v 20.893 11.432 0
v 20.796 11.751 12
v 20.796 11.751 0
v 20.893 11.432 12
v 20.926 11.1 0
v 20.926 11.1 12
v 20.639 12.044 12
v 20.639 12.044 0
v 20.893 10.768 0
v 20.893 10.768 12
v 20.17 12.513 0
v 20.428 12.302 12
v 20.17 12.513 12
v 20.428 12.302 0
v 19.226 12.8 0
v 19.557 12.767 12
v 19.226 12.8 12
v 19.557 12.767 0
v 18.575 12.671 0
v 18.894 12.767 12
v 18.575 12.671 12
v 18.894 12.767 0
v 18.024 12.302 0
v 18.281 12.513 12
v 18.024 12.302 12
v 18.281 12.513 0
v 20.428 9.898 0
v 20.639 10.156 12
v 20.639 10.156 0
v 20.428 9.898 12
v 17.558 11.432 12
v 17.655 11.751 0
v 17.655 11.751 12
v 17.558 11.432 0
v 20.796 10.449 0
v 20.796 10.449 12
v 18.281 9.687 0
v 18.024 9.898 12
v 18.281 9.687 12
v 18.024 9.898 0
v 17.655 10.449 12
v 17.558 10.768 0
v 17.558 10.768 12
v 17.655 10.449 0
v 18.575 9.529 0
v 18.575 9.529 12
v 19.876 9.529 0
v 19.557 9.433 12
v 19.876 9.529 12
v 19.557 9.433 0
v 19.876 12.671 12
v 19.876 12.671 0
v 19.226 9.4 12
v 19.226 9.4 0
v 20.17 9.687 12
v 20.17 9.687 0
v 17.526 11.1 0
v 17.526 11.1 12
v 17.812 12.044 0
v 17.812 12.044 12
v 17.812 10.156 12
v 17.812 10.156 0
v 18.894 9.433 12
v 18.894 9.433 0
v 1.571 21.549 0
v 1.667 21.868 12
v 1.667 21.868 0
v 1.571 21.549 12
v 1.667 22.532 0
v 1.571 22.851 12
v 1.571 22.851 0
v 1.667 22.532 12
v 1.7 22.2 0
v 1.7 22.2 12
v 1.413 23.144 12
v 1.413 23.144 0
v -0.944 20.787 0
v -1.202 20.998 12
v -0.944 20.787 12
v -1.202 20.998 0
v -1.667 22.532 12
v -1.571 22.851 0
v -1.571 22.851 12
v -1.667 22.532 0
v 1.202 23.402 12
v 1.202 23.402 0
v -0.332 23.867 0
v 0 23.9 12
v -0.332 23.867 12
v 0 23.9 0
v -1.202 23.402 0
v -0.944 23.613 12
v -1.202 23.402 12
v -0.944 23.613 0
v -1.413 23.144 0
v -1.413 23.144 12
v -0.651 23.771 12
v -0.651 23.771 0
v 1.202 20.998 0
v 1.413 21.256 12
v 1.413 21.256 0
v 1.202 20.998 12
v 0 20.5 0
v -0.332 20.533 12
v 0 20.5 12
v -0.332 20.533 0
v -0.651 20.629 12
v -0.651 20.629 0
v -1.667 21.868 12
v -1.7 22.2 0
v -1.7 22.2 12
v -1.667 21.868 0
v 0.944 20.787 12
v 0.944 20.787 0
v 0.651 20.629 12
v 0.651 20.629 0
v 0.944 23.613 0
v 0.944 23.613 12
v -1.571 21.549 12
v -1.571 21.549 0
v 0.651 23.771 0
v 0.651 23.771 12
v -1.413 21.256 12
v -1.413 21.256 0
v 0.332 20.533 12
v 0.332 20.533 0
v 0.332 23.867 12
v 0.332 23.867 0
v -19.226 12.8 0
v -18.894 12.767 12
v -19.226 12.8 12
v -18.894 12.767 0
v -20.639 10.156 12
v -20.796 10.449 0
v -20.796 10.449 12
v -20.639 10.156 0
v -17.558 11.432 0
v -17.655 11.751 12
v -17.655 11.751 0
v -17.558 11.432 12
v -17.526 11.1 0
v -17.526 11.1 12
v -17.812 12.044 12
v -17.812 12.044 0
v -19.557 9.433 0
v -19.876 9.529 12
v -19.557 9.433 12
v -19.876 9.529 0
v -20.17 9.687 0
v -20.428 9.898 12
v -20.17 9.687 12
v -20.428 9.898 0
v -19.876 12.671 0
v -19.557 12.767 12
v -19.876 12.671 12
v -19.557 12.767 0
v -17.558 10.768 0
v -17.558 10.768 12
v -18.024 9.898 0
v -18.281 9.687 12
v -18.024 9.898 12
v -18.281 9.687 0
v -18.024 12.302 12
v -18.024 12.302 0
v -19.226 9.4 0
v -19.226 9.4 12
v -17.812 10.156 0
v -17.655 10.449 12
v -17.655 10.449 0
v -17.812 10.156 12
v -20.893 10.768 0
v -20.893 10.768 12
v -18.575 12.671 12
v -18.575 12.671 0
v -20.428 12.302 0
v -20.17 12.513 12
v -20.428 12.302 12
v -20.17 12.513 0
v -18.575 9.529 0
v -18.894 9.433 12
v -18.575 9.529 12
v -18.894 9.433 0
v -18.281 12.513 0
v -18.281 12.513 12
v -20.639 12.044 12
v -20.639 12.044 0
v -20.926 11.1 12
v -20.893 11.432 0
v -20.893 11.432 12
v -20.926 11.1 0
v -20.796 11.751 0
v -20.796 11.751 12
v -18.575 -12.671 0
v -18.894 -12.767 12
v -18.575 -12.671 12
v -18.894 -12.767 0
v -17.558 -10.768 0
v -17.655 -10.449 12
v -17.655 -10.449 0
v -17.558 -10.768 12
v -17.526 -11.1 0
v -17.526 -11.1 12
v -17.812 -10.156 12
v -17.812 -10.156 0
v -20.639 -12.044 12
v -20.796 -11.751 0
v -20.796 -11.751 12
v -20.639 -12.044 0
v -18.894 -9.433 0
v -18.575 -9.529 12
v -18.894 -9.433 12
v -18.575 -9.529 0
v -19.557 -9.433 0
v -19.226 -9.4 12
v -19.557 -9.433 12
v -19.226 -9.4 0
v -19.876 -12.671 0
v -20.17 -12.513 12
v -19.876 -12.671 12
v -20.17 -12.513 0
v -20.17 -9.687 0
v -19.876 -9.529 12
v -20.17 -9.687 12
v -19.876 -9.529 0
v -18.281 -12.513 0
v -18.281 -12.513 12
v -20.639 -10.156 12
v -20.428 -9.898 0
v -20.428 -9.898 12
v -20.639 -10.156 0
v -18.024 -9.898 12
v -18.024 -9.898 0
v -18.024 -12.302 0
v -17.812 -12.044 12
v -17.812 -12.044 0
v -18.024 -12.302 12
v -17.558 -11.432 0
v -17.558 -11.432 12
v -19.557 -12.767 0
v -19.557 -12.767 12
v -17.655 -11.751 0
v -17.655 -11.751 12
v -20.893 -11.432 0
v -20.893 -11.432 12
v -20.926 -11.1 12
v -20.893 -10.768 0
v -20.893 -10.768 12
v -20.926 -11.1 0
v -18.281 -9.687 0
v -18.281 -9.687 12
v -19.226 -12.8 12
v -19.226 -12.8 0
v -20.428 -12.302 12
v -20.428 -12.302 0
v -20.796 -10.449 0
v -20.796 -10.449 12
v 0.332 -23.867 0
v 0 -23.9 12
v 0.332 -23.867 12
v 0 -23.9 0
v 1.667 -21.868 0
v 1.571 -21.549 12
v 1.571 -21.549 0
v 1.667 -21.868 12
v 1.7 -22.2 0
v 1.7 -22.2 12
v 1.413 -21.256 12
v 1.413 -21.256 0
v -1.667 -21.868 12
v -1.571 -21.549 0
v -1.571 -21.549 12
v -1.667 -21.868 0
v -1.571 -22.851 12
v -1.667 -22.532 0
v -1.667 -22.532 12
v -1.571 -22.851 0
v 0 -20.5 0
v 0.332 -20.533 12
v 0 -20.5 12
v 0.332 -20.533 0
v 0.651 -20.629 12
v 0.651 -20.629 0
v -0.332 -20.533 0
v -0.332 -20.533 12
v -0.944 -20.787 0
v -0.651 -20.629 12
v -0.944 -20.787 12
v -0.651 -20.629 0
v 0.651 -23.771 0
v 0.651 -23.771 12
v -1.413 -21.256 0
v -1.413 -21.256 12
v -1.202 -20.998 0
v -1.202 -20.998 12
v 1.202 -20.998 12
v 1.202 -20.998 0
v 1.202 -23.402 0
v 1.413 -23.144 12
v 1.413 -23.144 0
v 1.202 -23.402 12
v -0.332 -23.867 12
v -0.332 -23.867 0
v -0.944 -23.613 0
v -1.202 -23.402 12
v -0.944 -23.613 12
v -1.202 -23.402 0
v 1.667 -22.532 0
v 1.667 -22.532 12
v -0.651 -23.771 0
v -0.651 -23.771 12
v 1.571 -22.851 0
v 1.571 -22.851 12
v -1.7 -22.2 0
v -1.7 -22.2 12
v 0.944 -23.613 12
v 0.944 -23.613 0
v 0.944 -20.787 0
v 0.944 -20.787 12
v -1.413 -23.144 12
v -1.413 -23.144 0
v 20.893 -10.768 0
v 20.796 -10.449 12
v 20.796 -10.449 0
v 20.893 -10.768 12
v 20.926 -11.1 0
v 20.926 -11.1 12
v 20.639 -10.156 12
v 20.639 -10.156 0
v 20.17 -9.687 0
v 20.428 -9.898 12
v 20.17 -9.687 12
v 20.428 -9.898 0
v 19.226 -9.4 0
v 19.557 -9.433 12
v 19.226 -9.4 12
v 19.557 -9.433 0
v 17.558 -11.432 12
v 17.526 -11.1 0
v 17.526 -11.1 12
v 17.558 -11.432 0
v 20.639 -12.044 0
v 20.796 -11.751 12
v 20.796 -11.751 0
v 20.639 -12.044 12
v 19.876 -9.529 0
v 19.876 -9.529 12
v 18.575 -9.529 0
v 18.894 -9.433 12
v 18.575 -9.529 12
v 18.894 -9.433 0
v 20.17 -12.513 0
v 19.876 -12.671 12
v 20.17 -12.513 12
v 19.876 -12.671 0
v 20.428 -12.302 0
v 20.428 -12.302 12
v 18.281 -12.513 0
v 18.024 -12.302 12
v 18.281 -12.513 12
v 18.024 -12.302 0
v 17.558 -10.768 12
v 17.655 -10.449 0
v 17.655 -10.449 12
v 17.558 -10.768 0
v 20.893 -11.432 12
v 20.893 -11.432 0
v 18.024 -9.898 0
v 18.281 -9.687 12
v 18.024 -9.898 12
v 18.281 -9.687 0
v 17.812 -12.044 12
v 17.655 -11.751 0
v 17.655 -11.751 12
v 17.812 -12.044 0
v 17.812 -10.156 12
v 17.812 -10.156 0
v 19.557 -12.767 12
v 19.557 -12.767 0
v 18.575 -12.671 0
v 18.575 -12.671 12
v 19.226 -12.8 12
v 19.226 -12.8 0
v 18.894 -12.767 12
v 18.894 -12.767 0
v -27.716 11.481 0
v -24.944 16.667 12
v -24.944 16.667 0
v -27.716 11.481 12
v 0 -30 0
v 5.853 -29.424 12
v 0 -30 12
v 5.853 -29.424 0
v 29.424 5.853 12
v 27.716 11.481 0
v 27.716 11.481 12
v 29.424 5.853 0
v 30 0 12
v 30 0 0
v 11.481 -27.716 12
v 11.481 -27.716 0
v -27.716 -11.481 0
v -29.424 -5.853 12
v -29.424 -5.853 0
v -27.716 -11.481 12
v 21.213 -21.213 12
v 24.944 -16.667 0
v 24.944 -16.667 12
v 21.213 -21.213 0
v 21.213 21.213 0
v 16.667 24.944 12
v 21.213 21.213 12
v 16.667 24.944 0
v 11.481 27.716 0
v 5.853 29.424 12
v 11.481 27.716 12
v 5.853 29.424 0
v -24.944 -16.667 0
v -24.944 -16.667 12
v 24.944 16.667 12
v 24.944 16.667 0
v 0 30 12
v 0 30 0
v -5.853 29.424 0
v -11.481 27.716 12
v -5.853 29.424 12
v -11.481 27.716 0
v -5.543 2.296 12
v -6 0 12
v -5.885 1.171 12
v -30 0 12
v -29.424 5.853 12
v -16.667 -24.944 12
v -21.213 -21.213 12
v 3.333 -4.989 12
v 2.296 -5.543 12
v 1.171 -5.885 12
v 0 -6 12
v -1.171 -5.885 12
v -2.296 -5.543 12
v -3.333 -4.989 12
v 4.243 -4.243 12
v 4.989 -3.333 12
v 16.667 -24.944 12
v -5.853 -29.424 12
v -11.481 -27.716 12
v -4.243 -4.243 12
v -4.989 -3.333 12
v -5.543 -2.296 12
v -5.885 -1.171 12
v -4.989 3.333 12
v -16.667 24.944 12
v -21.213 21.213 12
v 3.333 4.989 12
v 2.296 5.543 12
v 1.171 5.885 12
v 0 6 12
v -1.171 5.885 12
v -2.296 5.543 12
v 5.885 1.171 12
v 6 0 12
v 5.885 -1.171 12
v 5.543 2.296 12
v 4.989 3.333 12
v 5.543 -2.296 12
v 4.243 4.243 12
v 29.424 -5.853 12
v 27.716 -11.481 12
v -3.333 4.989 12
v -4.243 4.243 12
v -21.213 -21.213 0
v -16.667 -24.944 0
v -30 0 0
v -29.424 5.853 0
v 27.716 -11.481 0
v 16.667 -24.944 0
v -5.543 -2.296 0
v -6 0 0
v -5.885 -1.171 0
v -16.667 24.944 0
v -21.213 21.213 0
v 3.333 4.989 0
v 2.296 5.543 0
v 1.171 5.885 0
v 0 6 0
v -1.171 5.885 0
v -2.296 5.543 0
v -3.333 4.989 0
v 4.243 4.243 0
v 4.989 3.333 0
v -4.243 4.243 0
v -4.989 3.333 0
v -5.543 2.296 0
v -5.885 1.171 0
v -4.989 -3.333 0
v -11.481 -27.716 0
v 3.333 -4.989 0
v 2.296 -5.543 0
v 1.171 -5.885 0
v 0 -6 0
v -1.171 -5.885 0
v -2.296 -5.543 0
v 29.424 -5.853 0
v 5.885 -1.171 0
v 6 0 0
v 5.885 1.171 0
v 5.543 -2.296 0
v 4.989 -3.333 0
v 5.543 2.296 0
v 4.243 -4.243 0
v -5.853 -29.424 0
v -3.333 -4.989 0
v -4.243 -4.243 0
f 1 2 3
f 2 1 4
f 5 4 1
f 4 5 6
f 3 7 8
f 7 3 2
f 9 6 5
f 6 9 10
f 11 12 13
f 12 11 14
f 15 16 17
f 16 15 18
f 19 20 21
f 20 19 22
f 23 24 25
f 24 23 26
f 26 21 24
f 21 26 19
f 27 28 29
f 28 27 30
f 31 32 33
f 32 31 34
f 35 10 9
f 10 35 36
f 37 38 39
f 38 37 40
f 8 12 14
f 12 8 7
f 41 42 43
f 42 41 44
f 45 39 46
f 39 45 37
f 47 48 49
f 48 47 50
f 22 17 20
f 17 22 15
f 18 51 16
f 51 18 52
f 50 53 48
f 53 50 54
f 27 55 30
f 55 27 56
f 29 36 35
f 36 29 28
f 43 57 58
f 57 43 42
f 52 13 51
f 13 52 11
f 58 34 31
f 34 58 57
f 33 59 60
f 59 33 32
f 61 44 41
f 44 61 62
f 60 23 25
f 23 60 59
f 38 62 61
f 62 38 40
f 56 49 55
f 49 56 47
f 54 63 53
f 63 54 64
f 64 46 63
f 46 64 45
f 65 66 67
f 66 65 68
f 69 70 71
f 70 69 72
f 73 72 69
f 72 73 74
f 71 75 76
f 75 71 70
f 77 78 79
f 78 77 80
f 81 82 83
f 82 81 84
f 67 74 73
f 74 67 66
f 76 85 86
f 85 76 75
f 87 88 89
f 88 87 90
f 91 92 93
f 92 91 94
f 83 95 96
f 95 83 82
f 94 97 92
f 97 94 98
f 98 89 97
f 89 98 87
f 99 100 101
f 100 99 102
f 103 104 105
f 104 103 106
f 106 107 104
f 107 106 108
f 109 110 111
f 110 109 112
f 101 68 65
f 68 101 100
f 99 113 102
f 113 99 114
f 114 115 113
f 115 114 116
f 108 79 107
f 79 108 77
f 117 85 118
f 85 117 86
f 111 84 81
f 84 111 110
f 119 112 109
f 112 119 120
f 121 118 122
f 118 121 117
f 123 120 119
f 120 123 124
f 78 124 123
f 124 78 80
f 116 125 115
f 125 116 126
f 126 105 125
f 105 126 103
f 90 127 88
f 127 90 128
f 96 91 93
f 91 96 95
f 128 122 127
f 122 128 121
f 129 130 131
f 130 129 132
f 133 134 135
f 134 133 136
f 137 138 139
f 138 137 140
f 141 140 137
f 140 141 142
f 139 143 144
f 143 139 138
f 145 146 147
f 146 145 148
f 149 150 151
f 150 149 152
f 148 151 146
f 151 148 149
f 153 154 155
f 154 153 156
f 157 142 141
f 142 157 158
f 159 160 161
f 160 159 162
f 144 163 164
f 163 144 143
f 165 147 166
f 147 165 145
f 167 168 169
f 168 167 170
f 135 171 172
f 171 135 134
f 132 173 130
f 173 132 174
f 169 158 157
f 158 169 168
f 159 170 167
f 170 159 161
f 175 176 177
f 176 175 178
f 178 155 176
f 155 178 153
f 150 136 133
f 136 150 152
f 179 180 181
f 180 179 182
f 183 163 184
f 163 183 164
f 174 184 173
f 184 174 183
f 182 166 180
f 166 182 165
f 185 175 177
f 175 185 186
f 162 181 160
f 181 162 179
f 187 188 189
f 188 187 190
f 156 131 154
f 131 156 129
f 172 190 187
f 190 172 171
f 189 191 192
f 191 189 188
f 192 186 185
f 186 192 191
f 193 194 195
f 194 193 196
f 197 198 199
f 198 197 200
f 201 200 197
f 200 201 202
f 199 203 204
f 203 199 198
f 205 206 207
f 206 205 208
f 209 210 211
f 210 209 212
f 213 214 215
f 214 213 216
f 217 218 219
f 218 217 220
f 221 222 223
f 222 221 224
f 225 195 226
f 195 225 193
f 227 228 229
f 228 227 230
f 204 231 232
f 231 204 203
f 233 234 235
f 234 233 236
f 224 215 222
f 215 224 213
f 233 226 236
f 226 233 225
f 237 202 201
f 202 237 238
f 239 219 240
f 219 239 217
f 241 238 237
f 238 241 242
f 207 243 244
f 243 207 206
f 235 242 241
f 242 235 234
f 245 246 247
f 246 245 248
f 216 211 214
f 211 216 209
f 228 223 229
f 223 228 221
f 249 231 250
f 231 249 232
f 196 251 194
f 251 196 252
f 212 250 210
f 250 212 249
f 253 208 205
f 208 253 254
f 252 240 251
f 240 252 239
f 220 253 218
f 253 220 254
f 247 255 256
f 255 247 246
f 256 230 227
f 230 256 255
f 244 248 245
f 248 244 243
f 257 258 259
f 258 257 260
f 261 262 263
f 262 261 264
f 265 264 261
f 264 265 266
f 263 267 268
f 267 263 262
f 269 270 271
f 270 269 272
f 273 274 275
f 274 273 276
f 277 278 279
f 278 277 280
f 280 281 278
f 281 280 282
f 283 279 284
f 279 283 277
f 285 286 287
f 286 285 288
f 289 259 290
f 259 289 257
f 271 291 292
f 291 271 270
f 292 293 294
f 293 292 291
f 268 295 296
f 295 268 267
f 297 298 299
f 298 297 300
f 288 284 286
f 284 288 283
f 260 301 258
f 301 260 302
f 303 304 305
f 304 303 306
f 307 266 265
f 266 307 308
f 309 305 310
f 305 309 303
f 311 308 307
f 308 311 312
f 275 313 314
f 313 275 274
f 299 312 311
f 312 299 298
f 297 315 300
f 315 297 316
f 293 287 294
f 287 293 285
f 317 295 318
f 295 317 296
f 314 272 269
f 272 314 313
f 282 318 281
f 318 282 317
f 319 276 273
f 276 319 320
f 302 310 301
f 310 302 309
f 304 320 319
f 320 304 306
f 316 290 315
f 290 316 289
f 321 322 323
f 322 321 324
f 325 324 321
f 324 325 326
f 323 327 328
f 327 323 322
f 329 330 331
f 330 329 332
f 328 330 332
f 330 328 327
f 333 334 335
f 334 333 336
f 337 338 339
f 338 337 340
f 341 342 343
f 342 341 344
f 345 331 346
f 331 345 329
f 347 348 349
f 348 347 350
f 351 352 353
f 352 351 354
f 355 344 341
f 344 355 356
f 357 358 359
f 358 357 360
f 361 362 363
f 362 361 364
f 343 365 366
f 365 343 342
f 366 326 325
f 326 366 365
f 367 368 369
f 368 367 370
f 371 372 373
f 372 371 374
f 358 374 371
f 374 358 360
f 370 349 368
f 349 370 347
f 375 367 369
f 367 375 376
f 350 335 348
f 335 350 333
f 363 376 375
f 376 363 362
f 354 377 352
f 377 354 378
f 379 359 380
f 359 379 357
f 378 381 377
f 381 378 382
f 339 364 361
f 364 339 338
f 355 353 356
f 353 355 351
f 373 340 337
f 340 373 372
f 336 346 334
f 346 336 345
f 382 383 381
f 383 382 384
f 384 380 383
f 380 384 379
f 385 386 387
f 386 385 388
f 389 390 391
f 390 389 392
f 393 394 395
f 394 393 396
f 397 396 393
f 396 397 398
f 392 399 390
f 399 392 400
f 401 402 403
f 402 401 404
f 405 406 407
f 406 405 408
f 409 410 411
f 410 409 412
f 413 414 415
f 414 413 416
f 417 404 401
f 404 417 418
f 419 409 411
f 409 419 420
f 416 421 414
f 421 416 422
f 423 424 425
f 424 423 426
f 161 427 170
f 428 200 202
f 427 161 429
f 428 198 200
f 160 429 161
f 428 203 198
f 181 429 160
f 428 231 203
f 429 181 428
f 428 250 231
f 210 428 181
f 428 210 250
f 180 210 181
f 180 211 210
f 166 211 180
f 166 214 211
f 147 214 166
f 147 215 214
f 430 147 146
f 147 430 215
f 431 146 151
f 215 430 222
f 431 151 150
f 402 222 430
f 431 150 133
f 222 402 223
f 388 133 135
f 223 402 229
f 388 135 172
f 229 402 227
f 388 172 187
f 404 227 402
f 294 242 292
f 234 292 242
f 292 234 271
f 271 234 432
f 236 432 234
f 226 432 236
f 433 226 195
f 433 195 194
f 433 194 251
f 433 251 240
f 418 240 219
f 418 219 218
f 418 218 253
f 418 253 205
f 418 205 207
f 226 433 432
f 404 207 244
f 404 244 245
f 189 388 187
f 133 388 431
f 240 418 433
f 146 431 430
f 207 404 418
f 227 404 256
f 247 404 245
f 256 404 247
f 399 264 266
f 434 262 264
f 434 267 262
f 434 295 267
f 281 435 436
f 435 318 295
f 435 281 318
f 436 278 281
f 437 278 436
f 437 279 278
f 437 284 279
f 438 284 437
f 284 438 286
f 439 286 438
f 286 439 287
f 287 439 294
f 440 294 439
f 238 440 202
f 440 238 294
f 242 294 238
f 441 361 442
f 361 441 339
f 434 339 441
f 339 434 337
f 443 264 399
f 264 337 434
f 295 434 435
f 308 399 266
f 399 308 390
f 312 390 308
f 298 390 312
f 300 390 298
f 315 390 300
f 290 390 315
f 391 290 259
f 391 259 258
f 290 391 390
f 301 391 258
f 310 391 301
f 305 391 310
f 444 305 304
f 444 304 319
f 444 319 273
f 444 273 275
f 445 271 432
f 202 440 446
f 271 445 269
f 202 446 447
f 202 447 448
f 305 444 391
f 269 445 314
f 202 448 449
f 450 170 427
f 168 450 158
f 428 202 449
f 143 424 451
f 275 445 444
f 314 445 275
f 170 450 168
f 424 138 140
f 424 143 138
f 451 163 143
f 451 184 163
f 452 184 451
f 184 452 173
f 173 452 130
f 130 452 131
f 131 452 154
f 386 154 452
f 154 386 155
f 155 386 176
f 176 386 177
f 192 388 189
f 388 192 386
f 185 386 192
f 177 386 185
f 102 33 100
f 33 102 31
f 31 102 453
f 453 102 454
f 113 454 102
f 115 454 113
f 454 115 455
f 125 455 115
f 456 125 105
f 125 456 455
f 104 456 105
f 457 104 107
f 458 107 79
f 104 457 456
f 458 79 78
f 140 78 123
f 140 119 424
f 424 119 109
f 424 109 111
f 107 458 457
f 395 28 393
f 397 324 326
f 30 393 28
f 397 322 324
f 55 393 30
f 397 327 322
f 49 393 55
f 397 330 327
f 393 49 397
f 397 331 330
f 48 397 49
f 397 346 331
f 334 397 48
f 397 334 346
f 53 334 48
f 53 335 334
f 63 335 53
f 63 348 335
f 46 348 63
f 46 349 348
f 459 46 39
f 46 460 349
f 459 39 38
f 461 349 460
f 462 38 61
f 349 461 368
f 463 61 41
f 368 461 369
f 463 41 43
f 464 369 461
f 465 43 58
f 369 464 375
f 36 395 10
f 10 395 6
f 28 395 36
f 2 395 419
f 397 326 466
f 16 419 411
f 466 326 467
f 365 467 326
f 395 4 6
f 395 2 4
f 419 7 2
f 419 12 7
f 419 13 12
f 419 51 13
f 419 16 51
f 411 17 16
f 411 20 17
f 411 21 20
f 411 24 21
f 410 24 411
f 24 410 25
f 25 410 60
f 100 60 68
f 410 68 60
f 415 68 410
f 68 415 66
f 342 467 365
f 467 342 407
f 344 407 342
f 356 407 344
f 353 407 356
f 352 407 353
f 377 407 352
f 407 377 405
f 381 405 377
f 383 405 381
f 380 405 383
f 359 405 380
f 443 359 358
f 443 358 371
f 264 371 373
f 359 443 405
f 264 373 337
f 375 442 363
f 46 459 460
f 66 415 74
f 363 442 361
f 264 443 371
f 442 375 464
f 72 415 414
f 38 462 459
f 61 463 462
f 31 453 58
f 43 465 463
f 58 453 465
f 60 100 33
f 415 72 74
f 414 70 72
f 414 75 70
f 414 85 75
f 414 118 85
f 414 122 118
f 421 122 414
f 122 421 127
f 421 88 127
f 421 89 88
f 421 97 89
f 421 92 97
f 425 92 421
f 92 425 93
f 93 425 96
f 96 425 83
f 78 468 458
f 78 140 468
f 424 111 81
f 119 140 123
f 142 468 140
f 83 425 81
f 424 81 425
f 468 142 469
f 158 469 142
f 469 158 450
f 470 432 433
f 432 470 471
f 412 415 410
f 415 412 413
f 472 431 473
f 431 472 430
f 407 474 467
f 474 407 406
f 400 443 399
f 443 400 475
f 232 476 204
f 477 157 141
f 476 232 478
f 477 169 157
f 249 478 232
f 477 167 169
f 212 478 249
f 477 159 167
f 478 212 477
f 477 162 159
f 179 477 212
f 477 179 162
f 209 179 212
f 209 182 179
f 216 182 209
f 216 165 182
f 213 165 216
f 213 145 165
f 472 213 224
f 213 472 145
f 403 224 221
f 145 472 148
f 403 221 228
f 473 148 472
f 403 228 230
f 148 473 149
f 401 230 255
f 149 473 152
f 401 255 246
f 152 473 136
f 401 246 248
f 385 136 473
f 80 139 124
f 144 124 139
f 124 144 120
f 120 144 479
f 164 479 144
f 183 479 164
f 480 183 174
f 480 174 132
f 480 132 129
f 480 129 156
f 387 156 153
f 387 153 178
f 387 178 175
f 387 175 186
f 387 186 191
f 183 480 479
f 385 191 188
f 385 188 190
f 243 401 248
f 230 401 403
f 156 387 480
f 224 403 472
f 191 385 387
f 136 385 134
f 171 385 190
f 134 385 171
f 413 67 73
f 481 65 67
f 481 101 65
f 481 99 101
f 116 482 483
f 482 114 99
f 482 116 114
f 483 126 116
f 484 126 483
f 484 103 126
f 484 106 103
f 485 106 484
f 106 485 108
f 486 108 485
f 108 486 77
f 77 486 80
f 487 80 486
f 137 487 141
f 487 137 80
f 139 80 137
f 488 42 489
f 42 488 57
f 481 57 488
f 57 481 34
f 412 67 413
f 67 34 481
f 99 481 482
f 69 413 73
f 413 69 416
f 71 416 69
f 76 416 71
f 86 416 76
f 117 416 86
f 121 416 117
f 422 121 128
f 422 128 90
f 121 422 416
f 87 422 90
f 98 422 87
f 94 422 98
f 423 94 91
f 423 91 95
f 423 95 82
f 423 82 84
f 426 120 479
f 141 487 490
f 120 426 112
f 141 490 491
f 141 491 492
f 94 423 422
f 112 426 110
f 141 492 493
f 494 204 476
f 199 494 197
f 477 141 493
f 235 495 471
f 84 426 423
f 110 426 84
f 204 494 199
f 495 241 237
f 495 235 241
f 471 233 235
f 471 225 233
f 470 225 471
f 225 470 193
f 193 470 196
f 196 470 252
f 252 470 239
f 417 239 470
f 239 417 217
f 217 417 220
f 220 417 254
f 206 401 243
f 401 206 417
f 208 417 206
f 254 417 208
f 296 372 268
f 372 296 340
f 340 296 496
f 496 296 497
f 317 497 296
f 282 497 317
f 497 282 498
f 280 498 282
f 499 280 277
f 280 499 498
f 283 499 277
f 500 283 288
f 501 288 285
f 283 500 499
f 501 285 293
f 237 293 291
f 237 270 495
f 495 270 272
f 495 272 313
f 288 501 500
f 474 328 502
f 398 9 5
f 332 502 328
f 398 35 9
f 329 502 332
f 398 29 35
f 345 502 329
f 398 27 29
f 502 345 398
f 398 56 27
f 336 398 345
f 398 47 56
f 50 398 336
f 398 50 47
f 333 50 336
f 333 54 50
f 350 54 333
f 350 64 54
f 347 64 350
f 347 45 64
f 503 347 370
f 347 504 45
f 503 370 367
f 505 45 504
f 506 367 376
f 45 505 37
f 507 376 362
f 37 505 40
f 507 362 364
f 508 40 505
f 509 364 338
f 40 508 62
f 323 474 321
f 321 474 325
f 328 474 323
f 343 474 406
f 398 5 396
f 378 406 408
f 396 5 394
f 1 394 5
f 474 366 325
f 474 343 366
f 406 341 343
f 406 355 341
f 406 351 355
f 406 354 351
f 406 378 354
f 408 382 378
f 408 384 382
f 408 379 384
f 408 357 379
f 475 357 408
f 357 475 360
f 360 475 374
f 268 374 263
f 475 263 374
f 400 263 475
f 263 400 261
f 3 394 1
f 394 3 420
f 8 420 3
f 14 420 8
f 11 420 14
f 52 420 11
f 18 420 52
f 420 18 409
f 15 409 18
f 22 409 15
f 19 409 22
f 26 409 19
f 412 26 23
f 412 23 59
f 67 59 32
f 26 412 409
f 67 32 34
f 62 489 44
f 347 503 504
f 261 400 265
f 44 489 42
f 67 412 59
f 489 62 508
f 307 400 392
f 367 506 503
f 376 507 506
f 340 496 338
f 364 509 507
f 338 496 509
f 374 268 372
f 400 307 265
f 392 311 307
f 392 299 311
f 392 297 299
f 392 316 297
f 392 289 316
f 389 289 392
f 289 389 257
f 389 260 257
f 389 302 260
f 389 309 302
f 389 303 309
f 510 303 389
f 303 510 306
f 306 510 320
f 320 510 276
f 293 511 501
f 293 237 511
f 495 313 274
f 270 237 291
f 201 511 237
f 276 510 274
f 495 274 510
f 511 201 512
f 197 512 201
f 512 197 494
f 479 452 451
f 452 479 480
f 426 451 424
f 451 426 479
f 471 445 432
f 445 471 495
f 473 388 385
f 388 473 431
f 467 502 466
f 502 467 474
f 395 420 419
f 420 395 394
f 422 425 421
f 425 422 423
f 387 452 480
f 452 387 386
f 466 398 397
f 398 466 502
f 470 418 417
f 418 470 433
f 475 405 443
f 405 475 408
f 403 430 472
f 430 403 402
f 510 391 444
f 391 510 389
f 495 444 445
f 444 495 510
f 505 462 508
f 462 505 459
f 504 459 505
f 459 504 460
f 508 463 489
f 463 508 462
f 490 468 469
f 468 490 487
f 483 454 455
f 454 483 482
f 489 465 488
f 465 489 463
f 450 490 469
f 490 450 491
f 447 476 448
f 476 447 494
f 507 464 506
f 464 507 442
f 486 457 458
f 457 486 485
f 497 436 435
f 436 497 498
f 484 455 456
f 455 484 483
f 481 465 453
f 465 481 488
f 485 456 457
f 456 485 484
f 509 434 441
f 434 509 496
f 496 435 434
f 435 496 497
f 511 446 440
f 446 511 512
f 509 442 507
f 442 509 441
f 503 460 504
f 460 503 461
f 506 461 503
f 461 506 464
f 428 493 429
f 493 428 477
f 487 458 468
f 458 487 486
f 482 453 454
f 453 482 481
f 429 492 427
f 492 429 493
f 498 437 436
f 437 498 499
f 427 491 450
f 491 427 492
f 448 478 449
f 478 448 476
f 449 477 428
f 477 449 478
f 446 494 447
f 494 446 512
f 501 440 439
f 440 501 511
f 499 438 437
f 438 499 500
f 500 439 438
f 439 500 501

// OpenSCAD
$fn = 32;

// ----------------------------------------------------------------------
// Flange Ø60 x 12
// 6 holes on a Ø44.4 bolt circle, bolted joints
// ----------------------------------------------------------------------

// --- parameters (mm) ---
flange_d = 60;   // outside diameter of the flange
thickness = 12;  // flange thickness
holes = 6;       // number of bolt holes
pcd = 44.4;      // bolt circle diameter
start_deg = 30;  // angle of the first hole, from +X
hole_d = 3.4;    // bolt hole diameter
bore_d = 12;     // central through bore
hub_d = 20;      // hub outside diameter
hub_h = 0;       // hub height above the flange face (0 = no hub)

// --- derived feature positions (mm) ---
height = thickness + hub_h;  // = 12   overall height of the part
pcd_r = pcd / 2;             // = 22.2   bolt circle radius
hole_step = 360 / holes;     // = 60   angular pitch
feature_centers = [
  [pcd_r * cos(start_deg + 0 * hole_step), pcd_r * sin(start_deg + 0 * hole_step)],
  [pcd_r * cos(start_deg + 1 * hole_step), pcd_r * sin(start_deg + 1 * hole_step)],
  [pcd_r * cos(start_deg + 2 * hole_step), pcd_r * sin(start_deg + 2 * hole_step)],
  [pcd_r * cos(start_deg + 3 * hole_step), pcd_r * sin(start_deg + 3 * hole_step)],
  [pcd_r * cos(start_deg + 4 * hole_step), pcd_r * sin(start_deg + 4 * hole_step)],
  [pcd_r * cos(start_deg + 5 * hole_step), pcd_r * sin(start_deg + 5 * hole_step)]
];   // bolt hole centres on the pitch circle

// flange disc, every hole and the bore cut straight through
difference() {
  union() {
    cylinder(d = flange_d, h = thickness);
  }
  translate([0, 0, -1]) cylinder(d = bore_d, h = height + 2);  // bore, through
  for (centre = feature_centers)
    translate([centre[0], centre[1], -1]) cylinder(d = hole_d, h = thickness + 2);
}
